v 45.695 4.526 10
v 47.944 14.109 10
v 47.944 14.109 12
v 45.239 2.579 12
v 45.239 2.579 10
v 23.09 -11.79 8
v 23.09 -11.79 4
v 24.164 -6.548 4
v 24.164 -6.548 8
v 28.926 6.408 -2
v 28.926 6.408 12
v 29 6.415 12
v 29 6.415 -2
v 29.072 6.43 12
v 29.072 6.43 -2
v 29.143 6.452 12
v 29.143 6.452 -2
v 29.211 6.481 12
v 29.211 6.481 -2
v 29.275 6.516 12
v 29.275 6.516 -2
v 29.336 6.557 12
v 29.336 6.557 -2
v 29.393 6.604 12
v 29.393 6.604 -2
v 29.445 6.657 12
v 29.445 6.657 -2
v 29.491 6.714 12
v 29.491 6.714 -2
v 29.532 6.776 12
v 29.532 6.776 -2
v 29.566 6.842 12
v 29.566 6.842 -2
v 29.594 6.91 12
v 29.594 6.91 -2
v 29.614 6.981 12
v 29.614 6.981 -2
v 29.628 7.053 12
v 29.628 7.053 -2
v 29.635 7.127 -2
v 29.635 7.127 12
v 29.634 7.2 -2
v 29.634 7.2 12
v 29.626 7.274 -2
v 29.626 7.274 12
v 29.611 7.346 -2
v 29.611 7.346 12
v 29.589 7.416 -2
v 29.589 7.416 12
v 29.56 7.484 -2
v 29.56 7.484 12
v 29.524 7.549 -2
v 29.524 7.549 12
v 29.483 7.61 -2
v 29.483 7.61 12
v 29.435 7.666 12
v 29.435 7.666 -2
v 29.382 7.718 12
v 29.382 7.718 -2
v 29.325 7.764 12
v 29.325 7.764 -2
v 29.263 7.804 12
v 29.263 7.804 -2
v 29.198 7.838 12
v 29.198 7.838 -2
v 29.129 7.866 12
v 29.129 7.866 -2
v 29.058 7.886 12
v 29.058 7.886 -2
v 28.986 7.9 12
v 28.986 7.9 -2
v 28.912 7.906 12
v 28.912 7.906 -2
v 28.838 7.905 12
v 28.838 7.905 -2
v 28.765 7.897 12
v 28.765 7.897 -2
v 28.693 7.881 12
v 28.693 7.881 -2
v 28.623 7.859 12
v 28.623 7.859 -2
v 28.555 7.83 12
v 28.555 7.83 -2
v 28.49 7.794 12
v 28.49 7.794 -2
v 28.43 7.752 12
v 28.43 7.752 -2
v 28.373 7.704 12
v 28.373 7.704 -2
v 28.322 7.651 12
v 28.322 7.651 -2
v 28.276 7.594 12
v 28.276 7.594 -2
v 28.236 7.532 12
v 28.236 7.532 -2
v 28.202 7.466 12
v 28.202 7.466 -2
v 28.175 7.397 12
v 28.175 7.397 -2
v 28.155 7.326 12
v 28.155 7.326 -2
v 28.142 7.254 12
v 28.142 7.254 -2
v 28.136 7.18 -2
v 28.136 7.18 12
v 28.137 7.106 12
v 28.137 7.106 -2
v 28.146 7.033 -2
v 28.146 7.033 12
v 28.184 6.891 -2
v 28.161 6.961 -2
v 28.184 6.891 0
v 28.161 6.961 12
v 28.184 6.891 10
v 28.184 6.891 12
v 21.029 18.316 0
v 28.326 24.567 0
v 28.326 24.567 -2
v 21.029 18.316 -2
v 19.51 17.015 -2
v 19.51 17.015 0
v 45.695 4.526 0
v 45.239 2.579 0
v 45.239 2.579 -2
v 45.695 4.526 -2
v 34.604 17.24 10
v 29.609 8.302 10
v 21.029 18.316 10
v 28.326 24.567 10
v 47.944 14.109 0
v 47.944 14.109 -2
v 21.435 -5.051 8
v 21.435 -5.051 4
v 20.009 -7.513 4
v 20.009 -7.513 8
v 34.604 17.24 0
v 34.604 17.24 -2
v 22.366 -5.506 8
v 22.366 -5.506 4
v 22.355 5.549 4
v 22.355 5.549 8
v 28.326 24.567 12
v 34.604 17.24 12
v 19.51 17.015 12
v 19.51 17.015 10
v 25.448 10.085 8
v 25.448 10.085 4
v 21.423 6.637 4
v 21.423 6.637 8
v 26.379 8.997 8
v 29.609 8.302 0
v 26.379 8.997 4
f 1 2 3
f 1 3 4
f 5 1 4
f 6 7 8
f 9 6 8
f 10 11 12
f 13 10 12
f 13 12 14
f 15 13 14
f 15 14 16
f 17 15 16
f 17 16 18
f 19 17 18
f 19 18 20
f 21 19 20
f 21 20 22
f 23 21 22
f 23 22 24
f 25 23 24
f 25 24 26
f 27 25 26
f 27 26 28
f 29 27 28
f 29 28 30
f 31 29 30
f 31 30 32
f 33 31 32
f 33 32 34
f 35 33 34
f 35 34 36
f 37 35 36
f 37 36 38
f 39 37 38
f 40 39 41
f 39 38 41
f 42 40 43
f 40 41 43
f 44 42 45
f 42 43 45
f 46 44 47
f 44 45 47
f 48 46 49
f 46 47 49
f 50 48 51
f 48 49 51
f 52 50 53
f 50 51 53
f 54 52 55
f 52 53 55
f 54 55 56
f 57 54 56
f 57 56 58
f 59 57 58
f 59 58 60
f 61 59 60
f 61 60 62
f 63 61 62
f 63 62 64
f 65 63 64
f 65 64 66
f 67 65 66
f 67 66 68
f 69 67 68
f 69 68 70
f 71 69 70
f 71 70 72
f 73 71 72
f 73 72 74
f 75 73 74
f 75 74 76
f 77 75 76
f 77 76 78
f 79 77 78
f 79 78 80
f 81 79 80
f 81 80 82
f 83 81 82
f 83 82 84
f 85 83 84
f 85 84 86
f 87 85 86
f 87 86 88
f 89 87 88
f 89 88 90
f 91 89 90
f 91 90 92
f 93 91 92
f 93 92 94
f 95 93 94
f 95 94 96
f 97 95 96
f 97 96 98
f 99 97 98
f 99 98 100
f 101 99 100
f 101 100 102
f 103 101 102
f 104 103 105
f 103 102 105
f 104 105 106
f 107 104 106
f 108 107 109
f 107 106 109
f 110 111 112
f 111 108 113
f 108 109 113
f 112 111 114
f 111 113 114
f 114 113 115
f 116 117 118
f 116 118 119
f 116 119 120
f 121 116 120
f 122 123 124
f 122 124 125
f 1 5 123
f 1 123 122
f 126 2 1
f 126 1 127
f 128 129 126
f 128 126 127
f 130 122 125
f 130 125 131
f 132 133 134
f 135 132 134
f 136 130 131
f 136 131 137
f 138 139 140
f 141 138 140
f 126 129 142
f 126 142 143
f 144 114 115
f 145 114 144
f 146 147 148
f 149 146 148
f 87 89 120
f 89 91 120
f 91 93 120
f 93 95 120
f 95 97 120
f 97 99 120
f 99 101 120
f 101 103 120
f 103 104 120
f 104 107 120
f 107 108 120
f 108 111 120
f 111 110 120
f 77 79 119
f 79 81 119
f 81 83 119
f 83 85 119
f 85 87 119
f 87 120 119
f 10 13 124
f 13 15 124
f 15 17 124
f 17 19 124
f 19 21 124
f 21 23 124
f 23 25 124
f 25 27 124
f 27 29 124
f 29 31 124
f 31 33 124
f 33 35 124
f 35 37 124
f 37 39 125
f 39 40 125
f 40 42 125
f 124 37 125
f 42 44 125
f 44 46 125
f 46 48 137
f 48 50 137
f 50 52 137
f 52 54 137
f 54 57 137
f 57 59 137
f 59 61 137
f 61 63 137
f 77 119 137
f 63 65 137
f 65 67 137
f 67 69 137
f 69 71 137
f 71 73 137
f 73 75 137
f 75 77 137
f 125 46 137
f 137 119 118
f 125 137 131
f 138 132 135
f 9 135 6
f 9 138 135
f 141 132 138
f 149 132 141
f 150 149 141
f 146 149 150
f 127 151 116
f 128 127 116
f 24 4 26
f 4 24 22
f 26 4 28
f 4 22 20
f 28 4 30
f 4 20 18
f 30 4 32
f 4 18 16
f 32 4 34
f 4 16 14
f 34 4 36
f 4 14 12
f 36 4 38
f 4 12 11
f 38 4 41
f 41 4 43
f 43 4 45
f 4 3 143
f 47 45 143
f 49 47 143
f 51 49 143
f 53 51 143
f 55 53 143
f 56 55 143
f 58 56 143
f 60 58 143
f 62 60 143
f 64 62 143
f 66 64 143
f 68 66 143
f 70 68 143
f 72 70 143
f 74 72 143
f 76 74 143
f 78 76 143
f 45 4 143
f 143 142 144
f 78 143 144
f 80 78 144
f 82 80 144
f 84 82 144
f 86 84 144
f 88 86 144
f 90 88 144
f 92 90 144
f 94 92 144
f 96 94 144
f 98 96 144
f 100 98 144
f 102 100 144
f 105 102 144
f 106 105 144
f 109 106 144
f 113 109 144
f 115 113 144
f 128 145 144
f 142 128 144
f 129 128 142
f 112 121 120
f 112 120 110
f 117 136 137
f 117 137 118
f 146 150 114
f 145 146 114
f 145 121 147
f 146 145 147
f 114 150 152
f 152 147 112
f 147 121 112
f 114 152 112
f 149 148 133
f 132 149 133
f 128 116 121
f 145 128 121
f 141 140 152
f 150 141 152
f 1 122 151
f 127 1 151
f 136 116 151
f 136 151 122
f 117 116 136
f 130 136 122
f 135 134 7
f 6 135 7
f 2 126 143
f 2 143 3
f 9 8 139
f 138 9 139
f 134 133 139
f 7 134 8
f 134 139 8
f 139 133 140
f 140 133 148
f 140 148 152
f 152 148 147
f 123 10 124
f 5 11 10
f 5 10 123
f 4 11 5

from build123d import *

# Parameters (mm, degrees)
EXTRUDE_THIN1_DEPTH = 10
BOSS_EXTRUDE1_DEPTH = 2
BOSS_EXTRUDE2_START = -10
BOSS_EXTRUDE2_DEPTH = 2
SKETCH3_R           = 0.75
CUT_EXTRUDE1_DEPTH  = 56.66160031
BOSS_EXTRUDE3_START = -8
BOSS_EXTRUDE3_DEPTH = 4


with BuildPart() as part:
    # Sketch1 → Extrude-Thin1 (new body)
    with BuildSketch(Plane(origin=(-21.326839193, -3.611933395, 0), x_dir=(1, 0, 0), z_dir=(0, 0, 1))):
        Polygon((40.837274636, 20.62649088), (49.842183721, 10.115955591), (66.565347849, 6.191262572), (67.022304548, 8.13836056), (50.935628307, 11.913678763), (42.35608206, 21.927730293), align=None)
    extrude(amount=EXTRUDE_THIN1_DEPTH)

    # Sketch2 → Boss-Extrude1 (add)
    with BuildSketch(Plane.XY.offset(10)):
        Polygon((19.510435444, 17.014557485), (28.32605504, 24.567346264), (34.604051118, 17.239665473), (47.944334875, 14.108887223), (45.238508656, 2.579329178), (28.515344528, 6.504022197), align=None)
    extrude(amount=BOSS_EXTRUDE1_DEPTH)

    # Sketch2<2> → Boss-Extrude2 (add)
    with BuildSketch(Plane.XY.offset(10).offset(BOSS_EXTRUDE2_START)):
        Polygon((21.029242867, 18.315796898), (19.510435444, 17.014557485), (28.515344528, 6.504022197), (45.238508656, 2.579329178), (45.695465355, 4.526427166), (29.608789115, 8.301745368), align=None)
        Polygon((28.32605504, 24.567346264), (21.029242867, 18.315796898), (29.608789115, 8.301745368), (45.695465355, 4.526427166), (47.944334875, 14.108887223), (34.604051118, 17.239665473), align=None)
    extrude(amount=-BOSS_EXTRUDE2_DEPTH)

    # Sketch3 → Cut-Extrude1 (cut, through all)
    with BuildSketch(Plane.XY.offset(12)):
        with Locations((28.885341988, 7.156403894)):
            Circle(SKETCH3_R)
    extrude(amount=-CUT_EXTRUDE1_DEPTH, mode=Mode.SUBTRACT)

    # Sketch4 → Boss-Extrude3 (add)
    with BuildSketch(Plane.XY.offset(12).offset(BOSS_EXTRUDE3_START)):
        Polygon((26.37923513, 8.997290369), (25.447689261, 10.084591266), (21.423335505, 6.636723131), (21.434748512, -5.051368103), (20.008730224, -7.513493145), (23.089867331, -11.79022436), (24.164473573, -6.548039274), (22.365676805, -5.506208724), (22.354881373, 5.549422234), align=None)
    extrude(amount=BOSS_EXTRUDE3_DEPTH)


solid = part.part
